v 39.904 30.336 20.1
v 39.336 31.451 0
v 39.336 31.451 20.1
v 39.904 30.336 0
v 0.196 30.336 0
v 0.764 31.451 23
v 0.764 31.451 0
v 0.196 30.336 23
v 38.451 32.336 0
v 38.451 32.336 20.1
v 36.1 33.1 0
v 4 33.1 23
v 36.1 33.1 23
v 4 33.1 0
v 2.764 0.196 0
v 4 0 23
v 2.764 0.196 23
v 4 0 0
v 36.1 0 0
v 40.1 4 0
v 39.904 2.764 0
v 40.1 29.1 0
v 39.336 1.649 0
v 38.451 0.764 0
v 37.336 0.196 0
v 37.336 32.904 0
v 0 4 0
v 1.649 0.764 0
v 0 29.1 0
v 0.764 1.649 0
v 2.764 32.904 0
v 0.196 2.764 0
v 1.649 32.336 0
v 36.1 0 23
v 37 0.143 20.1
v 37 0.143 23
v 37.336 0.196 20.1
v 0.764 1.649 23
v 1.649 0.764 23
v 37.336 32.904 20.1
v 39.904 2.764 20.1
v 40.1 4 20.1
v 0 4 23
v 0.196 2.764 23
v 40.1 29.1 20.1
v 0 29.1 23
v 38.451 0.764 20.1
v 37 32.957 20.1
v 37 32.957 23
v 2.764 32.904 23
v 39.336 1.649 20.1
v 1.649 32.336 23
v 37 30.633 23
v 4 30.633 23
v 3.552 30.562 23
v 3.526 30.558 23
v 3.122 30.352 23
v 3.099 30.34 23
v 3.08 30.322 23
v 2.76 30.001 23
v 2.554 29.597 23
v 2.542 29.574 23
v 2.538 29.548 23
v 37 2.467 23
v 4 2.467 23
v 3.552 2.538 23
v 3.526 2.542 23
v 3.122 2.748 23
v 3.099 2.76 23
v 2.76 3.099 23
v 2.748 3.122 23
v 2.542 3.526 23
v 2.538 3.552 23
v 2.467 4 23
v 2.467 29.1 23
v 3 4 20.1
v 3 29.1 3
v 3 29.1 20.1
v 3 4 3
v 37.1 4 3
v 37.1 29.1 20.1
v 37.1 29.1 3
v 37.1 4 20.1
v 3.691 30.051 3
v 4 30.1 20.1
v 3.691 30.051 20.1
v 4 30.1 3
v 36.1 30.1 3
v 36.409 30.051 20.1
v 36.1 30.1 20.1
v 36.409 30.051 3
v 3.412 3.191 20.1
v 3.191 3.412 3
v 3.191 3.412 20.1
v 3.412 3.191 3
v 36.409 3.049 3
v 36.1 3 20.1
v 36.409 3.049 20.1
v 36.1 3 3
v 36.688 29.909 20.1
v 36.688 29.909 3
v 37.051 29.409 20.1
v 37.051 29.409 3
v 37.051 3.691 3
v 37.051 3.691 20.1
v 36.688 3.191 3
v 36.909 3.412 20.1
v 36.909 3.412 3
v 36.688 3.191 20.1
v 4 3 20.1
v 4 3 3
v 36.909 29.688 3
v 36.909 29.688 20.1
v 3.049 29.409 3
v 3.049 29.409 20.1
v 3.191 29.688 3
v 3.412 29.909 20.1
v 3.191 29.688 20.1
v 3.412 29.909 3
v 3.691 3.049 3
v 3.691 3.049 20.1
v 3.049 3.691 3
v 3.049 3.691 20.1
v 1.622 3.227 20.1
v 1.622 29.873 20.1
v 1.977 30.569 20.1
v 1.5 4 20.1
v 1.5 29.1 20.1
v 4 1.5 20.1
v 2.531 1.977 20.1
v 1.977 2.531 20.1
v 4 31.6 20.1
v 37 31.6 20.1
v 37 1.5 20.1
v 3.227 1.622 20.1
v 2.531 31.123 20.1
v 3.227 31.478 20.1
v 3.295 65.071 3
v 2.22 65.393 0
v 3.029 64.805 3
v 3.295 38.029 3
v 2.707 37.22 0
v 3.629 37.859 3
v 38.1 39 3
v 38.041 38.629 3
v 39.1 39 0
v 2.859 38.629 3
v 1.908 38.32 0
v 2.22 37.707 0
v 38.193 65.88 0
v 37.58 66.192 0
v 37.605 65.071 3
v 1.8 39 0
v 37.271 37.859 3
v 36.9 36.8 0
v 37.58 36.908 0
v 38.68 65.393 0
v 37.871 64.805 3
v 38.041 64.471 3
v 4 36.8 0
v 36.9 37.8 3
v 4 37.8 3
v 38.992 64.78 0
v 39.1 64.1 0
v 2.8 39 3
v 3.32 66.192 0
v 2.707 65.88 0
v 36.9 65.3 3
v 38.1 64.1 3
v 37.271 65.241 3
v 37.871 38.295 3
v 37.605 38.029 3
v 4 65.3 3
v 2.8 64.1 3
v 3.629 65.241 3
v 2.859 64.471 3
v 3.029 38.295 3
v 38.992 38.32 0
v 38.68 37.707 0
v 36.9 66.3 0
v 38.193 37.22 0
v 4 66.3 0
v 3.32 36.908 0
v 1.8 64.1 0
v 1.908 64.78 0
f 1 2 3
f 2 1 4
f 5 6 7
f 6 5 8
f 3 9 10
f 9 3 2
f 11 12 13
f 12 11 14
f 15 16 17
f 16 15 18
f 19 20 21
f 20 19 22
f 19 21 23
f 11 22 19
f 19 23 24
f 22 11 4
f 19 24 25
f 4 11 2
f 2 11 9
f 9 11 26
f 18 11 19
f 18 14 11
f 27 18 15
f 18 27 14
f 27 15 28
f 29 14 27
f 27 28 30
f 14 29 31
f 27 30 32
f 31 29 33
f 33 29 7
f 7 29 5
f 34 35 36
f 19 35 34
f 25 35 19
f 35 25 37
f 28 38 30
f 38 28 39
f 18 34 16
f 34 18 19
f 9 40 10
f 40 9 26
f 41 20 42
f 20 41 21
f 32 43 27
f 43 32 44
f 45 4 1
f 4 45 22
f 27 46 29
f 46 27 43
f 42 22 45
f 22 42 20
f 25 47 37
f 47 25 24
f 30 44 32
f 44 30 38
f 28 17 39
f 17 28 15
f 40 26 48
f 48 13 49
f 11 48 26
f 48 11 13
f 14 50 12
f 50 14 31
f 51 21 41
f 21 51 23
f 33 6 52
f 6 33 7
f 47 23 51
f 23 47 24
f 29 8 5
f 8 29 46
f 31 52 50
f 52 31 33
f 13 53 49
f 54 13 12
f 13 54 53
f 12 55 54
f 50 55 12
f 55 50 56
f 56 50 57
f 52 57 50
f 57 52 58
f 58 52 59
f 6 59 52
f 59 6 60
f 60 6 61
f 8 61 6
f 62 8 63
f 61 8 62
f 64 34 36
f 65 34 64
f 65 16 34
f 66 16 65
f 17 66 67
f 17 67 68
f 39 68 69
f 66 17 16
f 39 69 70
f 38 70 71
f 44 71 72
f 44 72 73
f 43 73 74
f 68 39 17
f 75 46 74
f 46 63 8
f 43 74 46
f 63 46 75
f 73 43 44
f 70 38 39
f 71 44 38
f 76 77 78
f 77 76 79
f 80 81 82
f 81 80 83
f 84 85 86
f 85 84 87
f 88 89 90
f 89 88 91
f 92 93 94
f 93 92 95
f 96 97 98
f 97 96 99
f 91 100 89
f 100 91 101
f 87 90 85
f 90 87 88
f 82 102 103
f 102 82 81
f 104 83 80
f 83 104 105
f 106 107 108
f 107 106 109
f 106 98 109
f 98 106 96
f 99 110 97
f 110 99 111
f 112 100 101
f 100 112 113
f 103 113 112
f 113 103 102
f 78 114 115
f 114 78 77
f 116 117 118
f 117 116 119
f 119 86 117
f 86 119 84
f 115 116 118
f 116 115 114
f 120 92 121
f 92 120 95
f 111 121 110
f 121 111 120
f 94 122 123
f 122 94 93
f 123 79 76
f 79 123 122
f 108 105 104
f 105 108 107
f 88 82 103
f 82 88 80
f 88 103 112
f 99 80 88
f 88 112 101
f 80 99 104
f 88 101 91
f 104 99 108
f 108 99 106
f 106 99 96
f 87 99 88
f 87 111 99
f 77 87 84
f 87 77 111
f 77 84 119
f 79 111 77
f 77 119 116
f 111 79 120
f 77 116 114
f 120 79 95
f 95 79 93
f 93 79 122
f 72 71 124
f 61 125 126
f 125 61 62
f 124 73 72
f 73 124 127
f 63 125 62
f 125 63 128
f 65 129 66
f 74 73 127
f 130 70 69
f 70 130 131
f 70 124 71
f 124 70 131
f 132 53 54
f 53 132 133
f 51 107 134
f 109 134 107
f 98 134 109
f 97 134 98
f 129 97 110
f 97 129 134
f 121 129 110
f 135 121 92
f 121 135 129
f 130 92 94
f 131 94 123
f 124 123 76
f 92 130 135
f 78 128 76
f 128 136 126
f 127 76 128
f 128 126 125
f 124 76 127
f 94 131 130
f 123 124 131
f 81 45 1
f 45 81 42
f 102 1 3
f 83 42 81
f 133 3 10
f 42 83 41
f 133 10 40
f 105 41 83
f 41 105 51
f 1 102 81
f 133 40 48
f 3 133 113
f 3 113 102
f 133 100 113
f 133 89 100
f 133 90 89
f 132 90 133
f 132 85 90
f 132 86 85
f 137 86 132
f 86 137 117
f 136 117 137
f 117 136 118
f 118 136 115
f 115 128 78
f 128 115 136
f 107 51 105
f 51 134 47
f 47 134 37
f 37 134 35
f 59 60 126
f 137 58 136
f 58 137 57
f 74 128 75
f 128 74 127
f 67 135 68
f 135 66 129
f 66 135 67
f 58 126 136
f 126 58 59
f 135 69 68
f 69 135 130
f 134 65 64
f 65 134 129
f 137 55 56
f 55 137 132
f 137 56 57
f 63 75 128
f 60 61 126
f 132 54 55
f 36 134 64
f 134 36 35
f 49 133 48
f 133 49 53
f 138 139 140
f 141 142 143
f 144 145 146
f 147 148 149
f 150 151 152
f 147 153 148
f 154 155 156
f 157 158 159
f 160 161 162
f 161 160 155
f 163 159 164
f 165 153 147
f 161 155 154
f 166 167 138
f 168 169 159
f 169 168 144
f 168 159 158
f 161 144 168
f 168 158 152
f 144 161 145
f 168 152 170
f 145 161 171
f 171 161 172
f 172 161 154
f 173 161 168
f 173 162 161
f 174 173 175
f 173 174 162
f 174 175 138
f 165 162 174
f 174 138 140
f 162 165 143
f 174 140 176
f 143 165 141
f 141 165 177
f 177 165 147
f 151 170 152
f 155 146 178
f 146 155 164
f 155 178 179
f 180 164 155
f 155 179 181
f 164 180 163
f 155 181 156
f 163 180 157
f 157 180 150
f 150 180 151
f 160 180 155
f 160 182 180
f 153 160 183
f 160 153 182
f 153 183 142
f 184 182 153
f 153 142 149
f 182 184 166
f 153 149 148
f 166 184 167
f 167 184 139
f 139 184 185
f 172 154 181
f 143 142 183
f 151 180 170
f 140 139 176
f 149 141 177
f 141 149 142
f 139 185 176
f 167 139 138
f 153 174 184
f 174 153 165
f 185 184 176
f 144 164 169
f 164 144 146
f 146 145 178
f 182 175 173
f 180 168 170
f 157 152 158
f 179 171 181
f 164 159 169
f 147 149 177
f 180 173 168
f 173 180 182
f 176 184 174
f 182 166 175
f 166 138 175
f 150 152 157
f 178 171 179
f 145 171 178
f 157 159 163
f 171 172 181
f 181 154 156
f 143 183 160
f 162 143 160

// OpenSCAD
width = 33;
length = 40;
height = 20;
wall_thickness = 3;
//ensure that the edge roundness is greater than the wall thickness
edge_roundness = 4;
tolerance = 0.3;

$fn = 20;

/* [Hidden] */

//ignore!
inner_box_dimentions = [length,width,height];

difference ()
{

	hull()
	{
		addOutterCorners(0,0);
		addOutterCorners(1,0);
		addOutterCorners(0,1);
		addOutterCorners(1,1);
	}
	
	translate([0,0,wall_thickness])
	hull()
	{
		addInnerCorners(0,0);
		addInnerCorners(1,0);
		addInnerCorners(0,1);
		addInnerCorners(1,1);
	}

	translate([0,0,inner_box_dimentions[2]+0.1])
	hull()
	{
		addLidCorners(0,0);
		addLidCorners(1,0);
		addLidCorners(0,1);
		addLidCorners(1,1);
	}

	translate([inner_box_dimentions[0]-wall_thickness,0,inner_box_dimentions[2]+0.1])
	cube([wall_thickness,inner_box_dimentions[1],wall_thickness]);
}

difference ()
{
	translate([0,inner_box_dimentions[1]+2,0])
	hull()
	{
		Lid(0,0);
		Lid(1,0);
		Lid(0,1);
		Lid(1,1);
	}

	//translate([20,inner_box_dimentions[1]*1.5+2,0])
	//rotate([0,90,0]);

	
}



module addOutterCorners(x = 0, y = 0)
{
	translate([(inner_box_dimentions[0] - edge_roundness*2 + 0.1)*x,(inner_box_dimentions[1] - edge_roundness*2 +0.1)*y,0] + [edge_roundness,edge_roundness,0])

	cylinder(inner_box_dimentions[2]+wall_thickness,edge_roundness,edge_roundness);
	
	echo((inner_box_dimentions[0] - edge_roundness)*x);
	echo((inner_box_dimentions[1] - edge_roundness)*y);
}

module addInnerCorners(x = 0, y = 0)
{
	translate([(inner_box_dimentions[0] - edge_roundness*2 + 0.1)*x,(inner_box_dimentions[1] - edge_roundness*2 +0.1)*y,0] + [edge_roundness,edge_roundness,0])

	cylinder(inner_box_dimentions[2],edge_roundness-wall_thickness,edge_roundness-wall_thickness);
	
	echo((inner_box_dimentions[0] - edge_roundness)*x);
	echo((inner_box_dimentions[1] - edge_roundness)*y);
}

module addLidCorners(x = 0, y = 0)
{
	translate([(inner_box_dimentions[0] - edge_roundness*2 - 0.1 +wall_thickness)*x,(inner_box_dimentions[1] - edge_roundness*2 +0.1)*y,0] + [edge_roundness,edge_roundness,0])

	cylinder(wall_thickness,edge_roundness-wall_thickness+1.5,edge_roundness-wall_thickness+0.5);
	
	echo((inner_box_dimentions[0] - edge_roundness)*x);
	echo((inner_box_dimentions[1] - edge_roundness)*y);
}

module Lid(x = 0, y = 0)
{
	translate([(inner_box_dimentions[0] - edge_roundness*2 - 0.1 +wall_thickness-2)*x,(inner_box_dimentions[1] - edge_roundness*2 +0.1)*y,0] + [edge_roundness,edge_roundness,0])

	cylinder(wall_thickness,edge_roundness-wall_thickness+1.5-tolerance,edge_roundness-wall_thickness+0.5-tolerance);
	
	echo((inner_box_dimentions[0] - edge_roundness)*x);
	echo((inner_box_dimentions[1] - edge_roundness)*y);
}
